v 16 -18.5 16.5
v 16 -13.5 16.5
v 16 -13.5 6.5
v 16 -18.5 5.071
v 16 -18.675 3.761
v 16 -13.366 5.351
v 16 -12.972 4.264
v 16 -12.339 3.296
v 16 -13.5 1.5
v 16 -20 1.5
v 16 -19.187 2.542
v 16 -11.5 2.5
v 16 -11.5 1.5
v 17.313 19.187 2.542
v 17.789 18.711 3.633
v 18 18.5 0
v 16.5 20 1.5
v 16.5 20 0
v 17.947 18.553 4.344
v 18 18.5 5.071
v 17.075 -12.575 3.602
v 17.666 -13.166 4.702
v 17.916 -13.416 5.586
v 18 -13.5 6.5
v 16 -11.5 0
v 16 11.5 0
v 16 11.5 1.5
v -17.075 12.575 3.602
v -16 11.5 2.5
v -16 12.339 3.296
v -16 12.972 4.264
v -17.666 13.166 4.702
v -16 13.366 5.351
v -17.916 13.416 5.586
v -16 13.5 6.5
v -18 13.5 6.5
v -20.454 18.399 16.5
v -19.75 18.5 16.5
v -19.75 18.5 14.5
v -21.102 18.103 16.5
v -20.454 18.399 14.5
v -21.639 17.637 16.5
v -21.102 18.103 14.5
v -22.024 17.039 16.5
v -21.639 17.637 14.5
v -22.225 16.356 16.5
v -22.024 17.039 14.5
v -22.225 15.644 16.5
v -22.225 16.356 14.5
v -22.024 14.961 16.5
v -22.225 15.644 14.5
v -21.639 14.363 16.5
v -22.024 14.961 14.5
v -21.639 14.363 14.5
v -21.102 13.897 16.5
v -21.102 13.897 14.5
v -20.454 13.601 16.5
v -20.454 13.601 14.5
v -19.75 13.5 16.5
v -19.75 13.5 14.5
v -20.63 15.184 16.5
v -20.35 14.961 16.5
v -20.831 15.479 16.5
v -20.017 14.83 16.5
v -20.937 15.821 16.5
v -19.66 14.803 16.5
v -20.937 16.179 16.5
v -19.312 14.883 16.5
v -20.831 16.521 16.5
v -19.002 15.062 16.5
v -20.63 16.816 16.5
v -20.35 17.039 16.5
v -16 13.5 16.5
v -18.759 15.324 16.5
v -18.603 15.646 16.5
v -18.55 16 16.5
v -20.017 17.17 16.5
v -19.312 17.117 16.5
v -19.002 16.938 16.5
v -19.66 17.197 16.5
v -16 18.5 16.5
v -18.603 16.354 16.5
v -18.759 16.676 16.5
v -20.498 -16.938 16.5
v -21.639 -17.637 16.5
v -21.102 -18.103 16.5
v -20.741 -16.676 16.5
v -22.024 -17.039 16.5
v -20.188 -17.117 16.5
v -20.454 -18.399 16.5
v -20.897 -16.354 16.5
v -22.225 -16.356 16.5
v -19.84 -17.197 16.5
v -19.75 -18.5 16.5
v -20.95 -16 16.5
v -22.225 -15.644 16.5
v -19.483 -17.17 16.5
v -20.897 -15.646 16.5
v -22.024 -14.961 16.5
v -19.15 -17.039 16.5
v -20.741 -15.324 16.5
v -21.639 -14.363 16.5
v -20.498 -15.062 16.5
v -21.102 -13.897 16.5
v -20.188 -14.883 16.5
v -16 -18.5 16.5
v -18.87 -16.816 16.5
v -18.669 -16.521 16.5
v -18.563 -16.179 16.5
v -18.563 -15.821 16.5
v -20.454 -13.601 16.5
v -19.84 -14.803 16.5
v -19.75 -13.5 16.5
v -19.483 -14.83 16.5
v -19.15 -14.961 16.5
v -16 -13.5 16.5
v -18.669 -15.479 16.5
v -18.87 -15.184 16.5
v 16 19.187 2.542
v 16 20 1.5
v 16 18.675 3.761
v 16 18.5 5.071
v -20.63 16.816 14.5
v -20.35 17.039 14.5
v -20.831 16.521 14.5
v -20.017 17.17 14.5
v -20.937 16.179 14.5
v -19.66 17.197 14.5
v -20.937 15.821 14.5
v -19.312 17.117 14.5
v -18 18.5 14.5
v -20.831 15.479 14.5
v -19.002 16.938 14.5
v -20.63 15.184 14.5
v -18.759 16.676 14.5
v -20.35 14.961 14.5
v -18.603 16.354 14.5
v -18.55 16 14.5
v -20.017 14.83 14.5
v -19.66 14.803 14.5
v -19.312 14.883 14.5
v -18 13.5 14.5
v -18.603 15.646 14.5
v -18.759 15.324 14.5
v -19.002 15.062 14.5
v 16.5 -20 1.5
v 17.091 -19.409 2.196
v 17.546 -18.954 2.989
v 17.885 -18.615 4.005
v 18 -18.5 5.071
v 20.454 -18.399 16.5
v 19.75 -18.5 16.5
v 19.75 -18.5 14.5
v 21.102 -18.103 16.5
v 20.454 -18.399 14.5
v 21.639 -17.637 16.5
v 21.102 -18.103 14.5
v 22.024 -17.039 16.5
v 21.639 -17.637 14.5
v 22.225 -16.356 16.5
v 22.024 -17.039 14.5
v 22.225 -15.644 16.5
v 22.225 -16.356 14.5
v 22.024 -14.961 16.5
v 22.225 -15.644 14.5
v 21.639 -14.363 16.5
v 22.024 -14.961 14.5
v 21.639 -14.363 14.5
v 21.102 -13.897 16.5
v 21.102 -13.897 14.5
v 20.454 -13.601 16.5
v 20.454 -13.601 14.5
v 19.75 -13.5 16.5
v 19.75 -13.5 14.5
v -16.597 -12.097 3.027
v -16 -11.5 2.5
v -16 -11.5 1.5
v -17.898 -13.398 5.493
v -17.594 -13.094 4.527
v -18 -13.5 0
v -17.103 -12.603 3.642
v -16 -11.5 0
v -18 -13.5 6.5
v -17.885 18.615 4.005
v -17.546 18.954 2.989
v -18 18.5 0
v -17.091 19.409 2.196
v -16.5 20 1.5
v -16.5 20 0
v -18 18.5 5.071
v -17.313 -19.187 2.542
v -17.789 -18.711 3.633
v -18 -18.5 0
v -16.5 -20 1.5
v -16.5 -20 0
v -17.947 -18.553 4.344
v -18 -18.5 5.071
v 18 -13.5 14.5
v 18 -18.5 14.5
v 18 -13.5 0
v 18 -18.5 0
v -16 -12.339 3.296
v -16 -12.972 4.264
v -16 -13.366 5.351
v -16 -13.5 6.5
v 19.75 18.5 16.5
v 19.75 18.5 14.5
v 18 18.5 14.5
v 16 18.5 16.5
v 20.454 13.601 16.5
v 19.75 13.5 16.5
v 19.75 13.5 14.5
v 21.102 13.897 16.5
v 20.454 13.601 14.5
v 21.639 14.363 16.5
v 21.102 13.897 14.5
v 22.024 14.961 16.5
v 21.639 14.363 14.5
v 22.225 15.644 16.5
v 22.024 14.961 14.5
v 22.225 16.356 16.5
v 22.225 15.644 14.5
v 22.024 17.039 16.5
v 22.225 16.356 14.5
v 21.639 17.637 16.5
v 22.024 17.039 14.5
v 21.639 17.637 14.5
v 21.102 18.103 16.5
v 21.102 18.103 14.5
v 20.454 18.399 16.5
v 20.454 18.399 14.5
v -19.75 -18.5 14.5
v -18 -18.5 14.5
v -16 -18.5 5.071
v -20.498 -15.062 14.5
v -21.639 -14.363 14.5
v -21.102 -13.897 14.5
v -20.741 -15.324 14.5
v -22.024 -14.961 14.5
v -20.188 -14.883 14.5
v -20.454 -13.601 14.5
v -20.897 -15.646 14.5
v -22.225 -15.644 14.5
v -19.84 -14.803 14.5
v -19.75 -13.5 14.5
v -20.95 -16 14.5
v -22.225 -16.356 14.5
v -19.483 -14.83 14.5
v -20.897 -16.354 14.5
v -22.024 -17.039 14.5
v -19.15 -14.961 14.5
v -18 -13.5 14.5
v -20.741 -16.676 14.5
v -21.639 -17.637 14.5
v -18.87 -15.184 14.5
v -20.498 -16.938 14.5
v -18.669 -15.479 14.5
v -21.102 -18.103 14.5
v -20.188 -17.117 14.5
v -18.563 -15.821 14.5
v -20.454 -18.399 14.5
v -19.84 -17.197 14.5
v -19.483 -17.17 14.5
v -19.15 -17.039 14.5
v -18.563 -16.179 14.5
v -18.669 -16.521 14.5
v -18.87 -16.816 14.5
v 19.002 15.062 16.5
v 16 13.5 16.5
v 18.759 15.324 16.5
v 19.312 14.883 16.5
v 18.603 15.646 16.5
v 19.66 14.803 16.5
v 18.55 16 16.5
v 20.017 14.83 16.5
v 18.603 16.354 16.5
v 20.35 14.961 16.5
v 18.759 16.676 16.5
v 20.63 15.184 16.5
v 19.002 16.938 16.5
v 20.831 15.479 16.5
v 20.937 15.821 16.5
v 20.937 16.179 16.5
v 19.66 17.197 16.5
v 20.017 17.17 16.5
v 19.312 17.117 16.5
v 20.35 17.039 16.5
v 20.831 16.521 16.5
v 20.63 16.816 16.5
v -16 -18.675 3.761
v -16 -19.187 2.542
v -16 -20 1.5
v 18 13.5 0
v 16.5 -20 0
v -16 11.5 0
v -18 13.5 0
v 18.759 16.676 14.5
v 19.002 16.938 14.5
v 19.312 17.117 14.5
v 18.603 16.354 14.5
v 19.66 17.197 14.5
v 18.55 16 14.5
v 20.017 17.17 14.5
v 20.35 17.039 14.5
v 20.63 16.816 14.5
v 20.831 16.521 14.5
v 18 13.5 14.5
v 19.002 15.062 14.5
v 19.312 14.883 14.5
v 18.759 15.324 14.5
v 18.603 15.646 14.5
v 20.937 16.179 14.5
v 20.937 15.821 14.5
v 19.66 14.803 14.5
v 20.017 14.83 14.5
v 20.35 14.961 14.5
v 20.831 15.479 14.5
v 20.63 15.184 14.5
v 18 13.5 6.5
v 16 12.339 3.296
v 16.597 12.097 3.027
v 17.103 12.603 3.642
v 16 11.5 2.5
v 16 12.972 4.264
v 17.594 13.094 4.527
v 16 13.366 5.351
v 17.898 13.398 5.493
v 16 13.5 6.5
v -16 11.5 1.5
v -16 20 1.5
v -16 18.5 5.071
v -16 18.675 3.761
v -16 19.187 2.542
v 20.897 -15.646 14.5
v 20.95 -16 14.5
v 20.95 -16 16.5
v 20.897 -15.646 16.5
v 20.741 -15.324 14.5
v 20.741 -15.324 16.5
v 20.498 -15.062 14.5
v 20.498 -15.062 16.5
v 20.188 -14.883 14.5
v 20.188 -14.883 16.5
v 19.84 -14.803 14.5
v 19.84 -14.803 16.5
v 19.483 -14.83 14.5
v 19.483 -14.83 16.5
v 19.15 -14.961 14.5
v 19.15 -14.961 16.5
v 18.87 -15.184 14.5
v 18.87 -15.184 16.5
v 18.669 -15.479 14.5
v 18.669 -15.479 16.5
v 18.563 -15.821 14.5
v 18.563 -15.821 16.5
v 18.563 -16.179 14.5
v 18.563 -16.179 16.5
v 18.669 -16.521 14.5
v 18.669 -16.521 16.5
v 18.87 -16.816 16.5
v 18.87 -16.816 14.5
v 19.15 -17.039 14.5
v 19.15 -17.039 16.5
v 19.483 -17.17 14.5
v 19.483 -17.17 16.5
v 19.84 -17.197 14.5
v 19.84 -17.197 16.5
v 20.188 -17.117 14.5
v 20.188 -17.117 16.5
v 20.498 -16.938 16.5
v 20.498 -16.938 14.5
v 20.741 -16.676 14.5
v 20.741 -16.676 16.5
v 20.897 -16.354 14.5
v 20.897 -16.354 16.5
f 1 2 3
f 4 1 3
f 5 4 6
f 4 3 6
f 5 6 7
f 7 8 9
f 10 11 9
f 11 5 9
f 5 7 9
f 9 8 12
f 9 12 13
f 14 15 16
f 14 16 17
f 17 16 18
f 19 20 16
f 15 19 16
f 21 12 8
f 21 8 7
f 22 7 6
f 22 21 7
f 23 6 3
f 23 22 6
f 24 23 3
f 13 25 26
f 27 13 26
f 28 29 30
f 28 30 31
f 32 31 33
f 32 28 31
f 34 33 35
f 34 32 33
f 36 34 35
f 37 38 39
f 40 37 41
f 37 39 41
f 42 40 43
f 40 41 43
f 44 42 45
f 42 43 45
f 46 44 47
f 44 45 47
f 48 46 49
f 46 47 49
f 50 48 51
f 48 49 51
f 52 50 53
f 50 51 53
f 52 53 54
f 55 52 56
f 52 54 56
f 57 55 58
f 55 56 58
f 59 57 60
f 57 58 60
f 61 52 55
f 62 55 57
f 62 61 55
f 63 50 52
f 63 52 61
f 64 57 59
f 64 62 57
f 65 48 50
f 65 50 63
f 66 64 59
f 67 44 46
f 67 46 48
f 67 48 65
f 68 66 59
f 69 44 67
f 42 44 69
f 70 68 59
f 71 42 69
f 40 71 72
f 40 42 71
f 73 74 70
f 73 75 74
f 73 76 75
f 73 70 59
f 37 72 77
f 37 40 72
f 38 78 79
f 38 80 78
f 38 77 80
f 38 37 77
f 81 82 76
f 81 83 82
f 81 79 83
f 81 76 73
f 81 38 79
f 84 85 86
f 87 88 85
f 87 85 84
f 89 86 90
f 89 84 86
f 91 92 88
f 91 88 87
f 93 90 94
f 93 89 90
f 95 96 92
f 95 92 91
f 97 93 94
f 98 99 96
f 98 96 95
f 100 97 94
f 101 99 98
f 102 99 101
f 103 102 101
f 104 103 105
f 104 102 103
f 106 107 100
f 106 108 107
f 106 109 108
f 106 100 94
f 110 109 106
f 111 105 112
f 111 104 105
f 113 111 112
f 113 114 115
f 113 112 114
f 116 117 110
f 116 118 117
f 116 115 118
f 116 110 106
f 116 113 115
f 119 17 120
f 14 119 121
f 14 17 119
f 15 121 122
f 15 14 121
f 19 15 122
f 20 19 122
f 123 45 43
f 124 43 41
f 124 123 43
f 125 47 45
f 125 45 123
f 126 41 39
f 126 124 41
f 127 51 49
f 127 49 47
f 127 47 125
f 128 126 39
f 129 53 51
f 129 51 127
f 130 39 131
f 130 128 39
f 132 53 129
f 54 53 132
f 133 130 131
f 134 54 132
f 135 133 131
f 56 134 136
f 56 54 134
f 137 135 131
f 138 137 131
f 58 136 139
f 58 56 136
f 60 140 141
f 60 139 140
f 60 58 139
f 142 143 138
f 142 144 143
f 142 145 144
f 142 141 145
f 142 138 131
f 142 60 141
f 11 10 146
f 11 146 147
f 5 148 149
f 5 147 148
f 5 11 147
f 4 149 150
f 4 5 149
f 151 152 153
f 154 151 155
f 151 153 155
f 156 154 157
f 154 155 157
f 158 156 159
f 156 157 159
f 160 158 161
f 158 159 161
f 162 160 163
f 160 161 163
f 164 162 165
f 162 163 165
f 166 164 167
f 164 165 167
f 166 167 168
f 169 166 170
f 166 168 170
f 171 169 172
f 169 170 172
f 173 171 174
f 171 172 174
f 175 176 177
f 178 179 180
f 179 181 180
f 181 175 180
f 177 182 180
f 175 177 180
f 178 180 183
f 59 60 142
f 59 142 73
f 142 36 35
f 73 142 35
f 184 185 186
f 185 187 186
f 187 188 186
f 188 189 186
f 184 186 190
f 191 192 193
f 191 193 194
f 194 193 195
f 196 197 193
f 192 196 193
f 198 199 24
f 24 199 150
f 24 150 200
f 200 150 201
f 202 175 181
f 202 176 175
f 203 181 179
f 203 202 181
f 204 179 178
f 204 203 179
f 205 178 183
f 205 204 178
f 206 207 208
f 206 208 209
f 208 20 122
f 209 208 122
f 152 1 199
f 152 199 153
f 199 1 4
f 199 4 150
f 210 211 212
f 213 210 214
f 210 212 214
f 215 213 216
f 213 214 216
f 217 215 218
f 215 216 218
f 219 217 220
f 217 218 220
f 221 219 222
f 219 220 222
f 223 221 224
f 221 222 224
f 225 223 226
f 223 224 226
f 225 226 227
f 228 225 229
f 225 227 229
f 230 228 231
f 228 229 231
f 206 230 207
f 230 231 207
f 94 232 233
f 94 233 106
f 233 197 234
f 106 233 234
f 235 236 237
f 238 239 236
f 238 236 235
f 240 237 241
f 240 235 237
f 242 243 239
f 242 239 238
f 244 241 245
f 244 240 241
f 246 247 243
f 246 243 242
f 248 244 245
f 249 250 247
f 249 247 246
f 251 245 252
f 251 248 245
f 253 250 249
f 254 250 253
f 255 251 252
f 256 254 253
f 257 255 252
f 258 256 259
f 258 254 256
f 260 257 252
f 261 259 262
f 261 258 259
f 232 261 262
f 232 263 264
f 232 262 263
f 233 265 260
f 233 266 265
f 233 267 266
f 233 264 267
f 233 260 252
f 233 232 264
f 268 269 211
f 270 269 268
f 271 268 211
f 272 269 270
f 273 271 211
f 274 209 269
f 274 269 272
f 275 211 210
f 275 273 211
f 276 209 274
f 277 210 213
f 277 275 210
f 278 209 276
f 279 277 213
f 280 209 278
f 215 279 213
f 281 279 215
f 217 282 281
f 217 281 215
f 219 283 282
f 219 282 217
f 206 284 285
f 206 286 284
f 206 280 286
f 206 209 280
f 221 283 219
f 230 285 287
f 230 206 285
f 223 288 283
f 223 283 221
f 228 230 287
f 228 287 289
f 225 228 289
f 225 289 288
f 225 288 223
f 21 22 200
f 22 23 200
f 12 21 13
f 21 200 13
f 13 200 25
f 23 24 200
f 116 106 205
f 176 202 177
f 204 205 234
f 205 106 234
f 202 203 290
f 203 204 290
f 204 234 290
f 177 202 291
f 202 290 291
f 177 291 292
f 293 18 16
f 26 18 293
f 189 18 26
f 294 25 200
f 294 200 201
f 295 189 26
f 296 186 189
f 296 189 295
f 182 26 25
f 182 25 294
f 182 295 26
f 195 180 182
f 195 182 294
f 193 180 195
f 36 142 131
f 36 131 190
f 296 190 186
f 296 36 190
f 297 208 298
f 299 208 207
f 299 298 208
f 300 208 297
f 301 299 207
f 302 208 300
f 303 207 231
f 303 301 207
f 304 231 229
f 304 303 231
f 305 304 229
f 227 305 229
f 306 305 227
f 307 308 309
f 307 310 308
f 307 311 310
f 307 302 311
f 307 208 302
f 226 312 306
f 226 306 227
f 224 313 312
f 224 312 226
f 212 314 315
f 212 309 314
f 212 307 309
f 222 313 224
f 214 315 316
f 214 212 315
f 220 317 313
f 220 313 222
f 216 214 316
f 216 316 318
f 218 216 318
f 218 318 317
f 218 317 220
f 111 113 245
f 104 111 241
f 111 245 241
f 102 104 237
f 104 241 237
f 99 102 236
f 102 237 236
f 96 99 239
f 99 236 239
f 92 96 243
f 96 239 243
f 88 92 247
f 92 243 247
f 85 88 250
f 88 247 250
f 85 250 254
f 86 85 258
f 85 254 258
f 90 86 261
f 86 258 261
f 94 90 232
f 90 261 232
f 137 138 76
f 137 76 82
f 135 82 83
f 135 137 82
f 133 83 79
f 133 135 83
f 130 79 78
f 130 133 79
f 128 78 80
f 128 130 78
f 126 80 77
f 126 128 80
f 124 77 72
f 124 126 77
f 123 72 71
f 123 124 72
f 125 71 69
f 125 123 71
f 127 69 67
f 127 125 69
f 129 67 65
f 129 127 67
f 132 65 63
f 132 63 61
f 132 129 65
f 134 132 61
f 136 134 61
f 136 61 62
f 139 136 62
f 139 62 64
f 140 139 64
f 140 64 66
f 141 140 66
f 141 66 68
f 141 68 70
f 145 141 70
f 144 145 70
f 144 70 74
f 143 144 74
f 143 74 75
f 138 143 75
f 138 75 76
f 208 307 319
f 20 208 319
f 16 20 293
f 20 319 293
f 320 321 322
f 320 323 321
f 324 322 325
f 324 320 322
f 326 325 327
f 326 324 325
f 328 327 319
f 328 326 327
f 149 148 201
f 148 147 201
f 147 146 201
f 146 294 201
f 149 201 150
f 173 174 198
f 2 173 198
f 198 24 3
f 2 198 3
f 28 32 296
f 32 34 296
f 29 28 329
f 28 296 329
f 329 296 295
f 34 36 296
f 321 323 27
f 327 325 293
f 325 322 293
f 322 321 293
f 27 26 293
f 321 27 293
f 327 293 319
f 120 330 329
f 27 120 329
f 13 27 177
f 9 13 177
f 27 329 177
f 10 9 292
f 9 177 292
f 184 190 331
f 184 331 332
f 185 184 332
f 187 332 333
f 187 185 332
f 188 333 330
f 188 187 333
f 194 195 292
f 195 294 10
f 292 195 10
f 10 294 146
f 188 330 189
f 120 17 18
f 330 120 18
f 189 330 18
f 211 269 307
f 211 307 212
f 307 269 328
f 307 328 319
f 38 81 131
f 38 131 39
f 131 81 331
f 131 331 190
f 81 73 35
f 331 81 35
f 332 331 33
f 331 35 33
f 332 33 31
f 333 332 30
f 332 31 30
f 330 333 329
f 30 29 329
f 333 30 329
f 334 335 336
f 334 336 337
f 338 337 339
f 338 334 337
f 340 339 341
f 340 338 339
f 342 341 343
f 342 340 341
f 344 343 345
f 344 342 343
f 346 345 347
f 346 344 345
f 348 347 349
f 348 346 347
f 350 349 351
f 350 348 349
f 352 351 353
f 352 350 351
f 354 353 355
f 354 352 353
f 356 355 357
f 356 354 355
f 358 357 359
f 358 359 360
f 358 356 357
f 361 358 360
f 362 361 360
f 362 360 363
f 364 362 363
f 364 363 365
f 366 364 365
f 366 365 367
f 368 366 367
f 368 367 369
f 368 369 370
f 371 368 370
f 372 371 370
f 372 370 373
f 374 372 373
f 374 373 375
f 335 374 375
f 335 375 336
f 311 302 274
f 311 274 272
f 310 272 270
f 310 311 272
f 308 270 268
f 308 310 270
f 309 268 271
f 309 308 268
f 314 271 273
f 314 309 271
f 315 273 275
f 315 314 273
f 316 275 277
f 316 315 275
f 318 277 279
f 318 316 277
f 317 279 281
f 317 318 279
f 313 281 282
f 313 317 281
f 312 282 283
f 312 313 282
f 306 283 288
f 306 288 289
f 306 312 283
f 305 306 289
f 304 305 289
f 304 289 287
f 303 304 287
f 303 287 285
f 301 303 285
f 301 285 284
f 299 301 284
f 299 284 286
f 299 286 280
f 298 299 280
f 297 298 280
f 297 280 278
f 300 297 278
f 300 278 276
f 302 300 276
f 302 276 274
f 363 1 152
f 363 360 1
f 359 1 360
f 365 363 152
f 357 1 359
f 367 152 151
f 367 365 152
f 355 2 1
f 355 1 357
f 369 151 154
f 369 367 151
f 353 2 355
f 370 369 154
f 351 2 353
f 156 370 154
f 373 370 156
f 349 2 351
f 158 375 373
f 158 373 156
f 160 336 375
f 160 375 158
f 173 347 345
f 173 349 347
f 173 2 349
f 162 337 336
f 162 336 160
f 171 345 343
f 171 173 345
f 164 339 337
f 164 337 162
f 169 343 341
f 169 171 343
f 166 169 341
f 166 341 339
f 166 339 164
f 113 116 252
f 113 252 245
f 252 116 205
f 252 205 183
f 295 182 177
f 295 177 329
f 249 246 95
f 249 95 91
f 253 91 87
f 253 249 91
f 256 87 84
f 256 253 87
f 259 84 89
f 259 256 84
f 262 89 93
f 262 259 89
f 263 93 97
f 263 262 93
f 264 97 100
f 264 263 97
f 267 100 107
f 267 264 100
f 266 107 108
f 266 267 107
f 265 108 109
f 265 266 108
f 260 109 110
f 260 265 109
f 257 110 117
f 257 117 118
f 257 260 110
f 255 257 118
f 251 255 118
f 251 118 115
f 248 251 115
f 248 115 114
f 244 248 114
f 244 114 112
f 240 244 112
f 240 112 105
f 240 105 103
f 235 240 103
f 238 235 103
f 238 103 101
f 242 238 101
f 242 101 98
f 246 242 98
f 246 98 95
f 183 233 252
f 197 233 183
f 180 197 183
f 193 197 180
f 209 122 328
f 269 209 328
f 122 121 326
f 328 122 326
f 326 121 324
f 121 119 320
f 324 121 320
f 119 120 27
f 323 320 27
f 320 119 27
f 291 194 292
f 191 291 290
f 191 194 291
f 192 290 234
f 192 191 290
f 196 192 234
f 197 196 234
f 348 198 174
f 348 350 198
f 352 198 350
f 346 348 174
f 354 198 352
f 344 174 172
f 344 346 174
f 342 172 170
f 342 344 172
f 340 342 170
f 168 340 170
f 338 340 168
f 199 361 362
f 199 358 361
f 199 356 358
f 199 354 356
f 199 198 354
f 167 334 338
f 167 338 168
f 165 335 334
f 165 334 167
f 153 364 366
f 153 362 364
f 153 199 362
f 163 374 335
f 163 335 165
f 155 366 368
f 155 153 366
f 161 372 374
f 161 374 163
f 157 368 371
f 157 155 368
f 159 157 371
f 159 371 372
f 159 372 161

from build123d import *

# Parameters (mm, degrees)
SKETCH1_W               = 32
SKETCH1_H               = 40
BOSS_EXTRUDE1_DEPTH     = 1.5
SKETCH2_R               = 1.2
BOSS_EXTRUDE2_DEPTH     = 16.5
CUT_EXTRUDE1_DEPTH      = 35.165955277
CUT_EXTRUDE1_DEPTH_BACK = 35.165955277
SKETCH4_W               = 10
SKETCH4_H               = 14.5
CHAMFER1_SIZE           = 2
FILLET1_R               = 5


with BuildPart() as part:
    # Sketch1 → Boss-Extrude1 (new body)
    with BuildSketch(Plane.XY):
        Rectangle(SKETCH1_W, SKETCH1_H)
    extrude(amount=BOSS_EXTRUDE1_DEPTH)

    # Sketch2 → Boss-Extrude2 (add)
    # profile 1 of 4: a face of its own
    with BuildSketch(Plane.XY):
        with BuildLine():
            Line((-16, 18.5), (-19.75, 18.5))
            ThreePointArc((-19.75, 18.5), (-22.25, 16), (-19.75, 13.5))
            Line((-19.75, 13.5), (-16, 13.5))
            Line((-16, 13.5), (-16, 18.5))
        make_face()
        with Locations((-19.75, 16)):
            Circle(SKETCH2_R, mode=Mode.SUBTRACT)
    # profile 2 of 4: a face of its own
    with BuildSketch(Plane.XY):
        with BuildLine():
            Line((16, 18.5), (16, 13.5))
            Line((16, 13.5), (19.75, 13.5))
            ThreePointArc((19.75, 13.5), (22.25, 16), (19.75, 18.5))
            Line((19.75, 18.5), (16, 18.5))
        make_face()
        with Locations(Location((19.75, 16, 0), (0, 0, 180))):
            Circle(SKETCH2_R, mode=Mode.SUBTRACT)
    # profile 3 of 4: a face of its own
    with BuildSketch(Plane.XY):
        with BuildLine():
            Line((16, -18.5), (19.75, -18.5))
            ThreePointArc((19.75, -18.5), (22.25, -16), (19.75, -13.5))
            Line((19.75, -13.5), (16, -13.5))
            Line((16, -13.5), (16, -18.5))
        make_face()
        with Locations((19.75, -16)):
            Circle(SKETCH2_R, mode=Mode.SUBTRACT)
    # profile 4 of 4: a face of its own
    with BuildSketch(Plane.XY):
        with BuildLine():
            Line((-16, -18.5), (-16, -13.5))
            Line((-16, -13.5), (-19.75, -13.5))
            ThreePointArc((-19.75, -13.5), (-22.25, -16), (-19.75, -18.5))
            Line((-19.75, -18.5), (-16, -18.5))
        make_face()
        with Locations(Location((-19.75, -16, 0), (0, 0, 180))):
            Circle(SKETCH2_R, mode=Mode.SUBTRACT)
    extrude(amount=BOSS_EXTRUDE2_DEPTH)

    # Sketch4 → Cut-Extrude1 (cut, two sides: drawn at the far end of the back side and taken through both)
    with BuildSketch(Plane(origin=(0, 0, 0), x_dir=(1, 0, 0), z_dir=(0, 1, 0)).offset(-CUT_EXTRUDE1_DEPTH_BACK)):
        with Locations((-23, -7.25)):
            Rectangle(SKETCH4_W, SKETCH4_H)
        with Locations((23, -7.25)):
            Rectangle(SKETCH4_W, SKETCH4_H)
    extrude(amount=CUT_EXTRUDE1_DEPTH + CUT_EXTRUDE1_DEPTH_BACK, mode=Mode.SUBTRACT)

    # Chamfer1
    # the kernel refuses this chamfer: 2 mm, written as the material it adds along each edge
    with BuildSketch(Plane(origin=(-16, -13.5, 0), x_dir=(-1, 0, 0), z_dir=(0, 0, 1)), Plane(origin=(-16, 13.5, 0), x_dir=(0, -1, 0), z_dir=(0, 0, 1)), Plane(origin=(16, -13.5, 0), x_dir=(0, 1, 0), z_dir=(0, 0, 1)), Plane(origin=(16, 13.5, 0), x_dir=(1, 0, 0), z_dir=(0, 0, 1))) as chamfer1_piece_1:
        Polygon((CHAMFER1_SIZE, 0), (0, -CHAMFER1_SIZE), (0, 0), align=None)
    extrude(amount=1.5)
    with BuildSketch(Plane(origin=(-16, -18.5, 0), x_dir=(0, -1, 0), z_dir=(0, 0, 1))) as chamfer1_piece_2_section:
        Polygon((CHAMFER1_SIZE, 0), (0, -CHAMFER1_SIZE), (0, 0), align=None)
    chamfer1_piece_2 = extrude(amount=1.5, mode=Mode.PRIVATE)
    chamfer1_piece_2 = split(chamfer1_piece_2, bisect_by=Plane(origin=(-16, -20, 0), z_dir=(0, 1, 0)), keep=Keep.TOP, mode=Mode.PRIVATE)
    add(chamfer1_piece_2)
    with BuildSketch(Plane(origin=(-16, 18.5, 0), x_dir=(0, 1, 0), z_dir=(0, 0, 1))) as chamfer1_piece_3_section:
        Polygon((CHAMFER1_SIZE, 0), (0, CHAMFER1_SIZE), (0, 0), align=None)
    chamfer1_piece_3 = extrude(amount=1.5, mode=Mode.PRIVATE)
    chamfer1_piece_3 = split(chamfer1_piece_3, bisect_by=Plane(origin=(-16, 20, 0), z_dir=(0, -1, 0)), keep=Keep.TOP, mode=Mode.PRIVATE)
    add(chamfer1_piece_3)
    with BuildSketch(Plane(origin=(16, -18.5, 0), x_dir=(1, 0, 0), z_dir=(0, 0, 1))) as chamfer1_piece_4_section:
        Polygon((CHAMFER1_SIZE, 0), (0, -CHAMFER1_SIZE), (0, 0), align=None)
    chamfer1_piece_4 = extrude(amount=1.5, mode=Mode.PRIVATE)
    chamfer1_piece_4 = split(chamfer1_piece_4, bisect_by=Plane(origin=(16, -20, 0), z_dir=(0, 1, 0)), keep=Keep.TOP, mode=Mode.PRIVATE)
    add(chamfer1_piece_4)
    with BuildSketch(Plane(origin=(16, 18.5, 0), x_dir=(0, 1, 0), z_dir=(0, 0, 1))) as chamfer1_piece_5_section:
        Polygon((CHAMFER1_SIZE, 0), (0, -CHAMFER1_SIZE), (0, 0), align=None)
    chamfer1_piece_5 = extrude(amount=1.5, mode=Mode.PRIVATE)
    chamfer1_piece_5 = split(chamfer1_piece_5, bisect_by=Plane(origin=(16, 20, 0), z_dir=(0, -1, 0)), keep=Keep.TOP, mode=Mode.PRIVATE)
    add(chamfer1_piece_5)

    # Fillet1
    # the kernel refuses this fillet: 5 mm, written as the material it adds along each edge
    with BuildSketch(Plane(origin=(-16, -13.5, 1.5), x_dir=(0, 0, 1), z_dir=(-1, 0, 0))) as fillet1_piece_1_section:
        with BuildLine():
            CenterArc((FILLET1_R, FILLET1_R), FILLET1_R, 180, 90)
            Line((0, FILLET1_R), (0, 0))
            Line((0, 0), (FILLET1_R, 0))
        make_face()
    fillet1_piece_1 = extrude(amount=14.5, mode=Mode.PRIVATE)
    fillet1_piece_1 = split(fillet1_piece_1, bisect_by=Plane(origin=(-17, -12.5, 1.5), z_dir=(0.7071067811865476, -0.7071067811865476, 0)), keep=Keep.TOP, mode=Mode.PRIVATE)
    add(fillet1_piece_1)
    with BuildSketch(Plane(origin=(-26.926785536, -18.5, 1.5), x_dir=(0, 0, 1), z_dir=(1, 0, 0))) as fillet1_piece_2_section:
        with BuildLine():
            CenterArc((3.570714214, 5), FILLET1_R, 224.427004001, 45.572995999)
            Line((0, 1.5), (0, 0))
            Line((0, 0), (3.570714214, 0))
        make_face()
    fillet1_piece_2 = extrude(amount=10.926785536, mode=Mode.PRIVATE)
    fillet1_piece_2 = split(fillet1_piece_2, bisect_by=Plane(origin=(-22.463392768, -14.036607232, 1.5), z_dir=(0.7071067811865476, 0.7071067811865476, 0)), keep=Keep.TOP, mode=Mode.PRIVATE)
    add(fillet1_piece_2)
    with BuildSketch(Plane(origin=(-30.5, 13.5, 1.5), x_dir=(0, 0, 1), z_dir=(1, 0, 0))) as fillet1_piece_3_section:
        with BuildLine():
            CenterArc((FILLET1_R, FILLET1_R), FILLET1_R, 180, 90)
            Line((0, FILLET1_R), (0, 0))
            Line((0, 0), (FILLET1_R, 0))
        make_face()
    fillet1_piece_3 = extrude(amount=14.5, mode=Mode.PRIVATE)
    fillet1_piece_3 = split(fillet1_piece_3, bisect_by=Plane(origin=(-24.25, 19.75, 1.5), z_dir=(0.7071067811865476, 0.7071067811865476, 0)), keep=Keep.TOP, mode=Mode.PRIVATE)
    add(fillet1_piece_3)
    with BuildSketch(Plane(origin=(-26.926785536, 18.5, 1.5), x_dir=(0, 0, 1), z_dir=(1, 0, 0))) as fillet1_piece_4_section:
        with BuildLine():
            CenterArc((3.570714214, -5), FILLET1_R, 90, 45.572995999)
            Line((0, -1.5), (0, 0))
            Line((0, 0), (3.570714214, 0))
        make_face()
    fillet1_piece_4 = extrude(amount=10.926785536, mode=Mode.PRIVATE)
    fillet1_piece_4 = split(fillet1_piece_4, bisect_by=Plane(origin=(-22.463392768, 14.036607232, 1.5), z_dir=(0.7071067811865476, -0.7071067811865476, 0)), keep=Keep.TOP, mode=Mode.PRIVATE)
    add(fillet1_piece_4)
    with BuildSketch(Plane(origin=(16, -18.5, 1.5), x_dir=(0, 0, 1), z_dir=(1, 0, 0))) as fillet1_piece_5_section:
        with BuildLine():
            CenterArc((3.570714214, 5), FILLET1_R, 224.427004001, 45.572995999)
            Line((0, 1.5), (0, 0))
            Line((0, 0), (3.570714214, 0))
        make_face()
    fillet1_piece_5 = extrude(amount=10.926785536, mode=Mode.PRIVATE)
    fillet1_piece_5 = split(fillet1_piece_5, bisect_by=Plane(origin=(17, -19.5, 1.5), z_dir=(-0.7071067811865476, 0.7071067811865476, 0)), keep=Keep.TOP, mode=Mode.PRIVATE)
    add(fillet1_piece_5)
    with BuildSketch(Plane(origin=(30.5, -13.5, 1.5), x_dir=(0, 0, 1), z_dir=(-1, 0, 0))) as fillet1_piece_6_section:
        with BuildLine():
            CenterArc((FILLET1_R, FILLET1_R), FILLET1_R, 180, 90)
            Line((0, FILLET1_R), (0, 0))
            Line((0, 0), (FILLET1_R, 0))
        make_face()
    fillet1_piece_6 = extrude(amount=14.5, mode=Mode.PRIVATE)
    fillet1_piece_6 = split(fillet1_piece_6, bisect_by=Plane(origin=(24.25, -19.75, 1.5), z_dir=(-0.7071067811865476, -0.7071067811865476, 0)), keep=Keep.TOP, mode=Mode.PRIVATE)
    add(fillet1_piece_6)
    with BuildSketch(Plane(origin=(16, 13.5, 1.5), x_dir=(0, -1, 0), z_dir=(1, 0, 0))) as fillet1_piece_7_section:
        with BuildLine():
            CenterArc((FILLET1_R, -FILLET1_R), FILLET1_R, 90, 90)
            Line((0, -FILLET1_R), (0, 0))
            Line((0, 0), (FILLET1_R, 0))
        make_face()
    fillet1_piece_7 = extrude(amount=14.5, mode=Mode.PRIVATE)
    fillet1_piece_7 = split(fillet1_piece_7, bisect_by=Plane(origin=(17, 12.5, 1.5), z_dir=(-0.7071067811865476, 0.7071067811865476, 0)), keep=Keep.TOP, mode=Mode.PRIVATE)
    add(fillet1_piece_7)
    with BuildSketch(Plane(origin=(26.926785536, 18.5, 1.5), x_dir=(0, 1, 0), z_dir=(-1, 0, 0))) as fillet1_piece_8_section:
        with BuildLine():
            CenterArc((5, -3.570714214), FILLET1_R, 134.427004001, 45.572995999)
            Line((0, -3.570714214), (0, 0))
            Line((0, 0), (1.5, 0))
        make_face()
    fillet1_piece_8 = extrude(amount=10.926785536, mode=Mode.PRIVATE)
    fillet1_piece_8 = split(fillet1_piece_8, bisect_by=Plane(origin=(22.463392768, 14.036607232, 1.5), z_dir=(-0.7071067811865476, -0.7071067811865476, 0)), keep=Keep.TOP, mode=Mode.PRIVATE)
    add(fillet1_piece_8)


solid = part.part
